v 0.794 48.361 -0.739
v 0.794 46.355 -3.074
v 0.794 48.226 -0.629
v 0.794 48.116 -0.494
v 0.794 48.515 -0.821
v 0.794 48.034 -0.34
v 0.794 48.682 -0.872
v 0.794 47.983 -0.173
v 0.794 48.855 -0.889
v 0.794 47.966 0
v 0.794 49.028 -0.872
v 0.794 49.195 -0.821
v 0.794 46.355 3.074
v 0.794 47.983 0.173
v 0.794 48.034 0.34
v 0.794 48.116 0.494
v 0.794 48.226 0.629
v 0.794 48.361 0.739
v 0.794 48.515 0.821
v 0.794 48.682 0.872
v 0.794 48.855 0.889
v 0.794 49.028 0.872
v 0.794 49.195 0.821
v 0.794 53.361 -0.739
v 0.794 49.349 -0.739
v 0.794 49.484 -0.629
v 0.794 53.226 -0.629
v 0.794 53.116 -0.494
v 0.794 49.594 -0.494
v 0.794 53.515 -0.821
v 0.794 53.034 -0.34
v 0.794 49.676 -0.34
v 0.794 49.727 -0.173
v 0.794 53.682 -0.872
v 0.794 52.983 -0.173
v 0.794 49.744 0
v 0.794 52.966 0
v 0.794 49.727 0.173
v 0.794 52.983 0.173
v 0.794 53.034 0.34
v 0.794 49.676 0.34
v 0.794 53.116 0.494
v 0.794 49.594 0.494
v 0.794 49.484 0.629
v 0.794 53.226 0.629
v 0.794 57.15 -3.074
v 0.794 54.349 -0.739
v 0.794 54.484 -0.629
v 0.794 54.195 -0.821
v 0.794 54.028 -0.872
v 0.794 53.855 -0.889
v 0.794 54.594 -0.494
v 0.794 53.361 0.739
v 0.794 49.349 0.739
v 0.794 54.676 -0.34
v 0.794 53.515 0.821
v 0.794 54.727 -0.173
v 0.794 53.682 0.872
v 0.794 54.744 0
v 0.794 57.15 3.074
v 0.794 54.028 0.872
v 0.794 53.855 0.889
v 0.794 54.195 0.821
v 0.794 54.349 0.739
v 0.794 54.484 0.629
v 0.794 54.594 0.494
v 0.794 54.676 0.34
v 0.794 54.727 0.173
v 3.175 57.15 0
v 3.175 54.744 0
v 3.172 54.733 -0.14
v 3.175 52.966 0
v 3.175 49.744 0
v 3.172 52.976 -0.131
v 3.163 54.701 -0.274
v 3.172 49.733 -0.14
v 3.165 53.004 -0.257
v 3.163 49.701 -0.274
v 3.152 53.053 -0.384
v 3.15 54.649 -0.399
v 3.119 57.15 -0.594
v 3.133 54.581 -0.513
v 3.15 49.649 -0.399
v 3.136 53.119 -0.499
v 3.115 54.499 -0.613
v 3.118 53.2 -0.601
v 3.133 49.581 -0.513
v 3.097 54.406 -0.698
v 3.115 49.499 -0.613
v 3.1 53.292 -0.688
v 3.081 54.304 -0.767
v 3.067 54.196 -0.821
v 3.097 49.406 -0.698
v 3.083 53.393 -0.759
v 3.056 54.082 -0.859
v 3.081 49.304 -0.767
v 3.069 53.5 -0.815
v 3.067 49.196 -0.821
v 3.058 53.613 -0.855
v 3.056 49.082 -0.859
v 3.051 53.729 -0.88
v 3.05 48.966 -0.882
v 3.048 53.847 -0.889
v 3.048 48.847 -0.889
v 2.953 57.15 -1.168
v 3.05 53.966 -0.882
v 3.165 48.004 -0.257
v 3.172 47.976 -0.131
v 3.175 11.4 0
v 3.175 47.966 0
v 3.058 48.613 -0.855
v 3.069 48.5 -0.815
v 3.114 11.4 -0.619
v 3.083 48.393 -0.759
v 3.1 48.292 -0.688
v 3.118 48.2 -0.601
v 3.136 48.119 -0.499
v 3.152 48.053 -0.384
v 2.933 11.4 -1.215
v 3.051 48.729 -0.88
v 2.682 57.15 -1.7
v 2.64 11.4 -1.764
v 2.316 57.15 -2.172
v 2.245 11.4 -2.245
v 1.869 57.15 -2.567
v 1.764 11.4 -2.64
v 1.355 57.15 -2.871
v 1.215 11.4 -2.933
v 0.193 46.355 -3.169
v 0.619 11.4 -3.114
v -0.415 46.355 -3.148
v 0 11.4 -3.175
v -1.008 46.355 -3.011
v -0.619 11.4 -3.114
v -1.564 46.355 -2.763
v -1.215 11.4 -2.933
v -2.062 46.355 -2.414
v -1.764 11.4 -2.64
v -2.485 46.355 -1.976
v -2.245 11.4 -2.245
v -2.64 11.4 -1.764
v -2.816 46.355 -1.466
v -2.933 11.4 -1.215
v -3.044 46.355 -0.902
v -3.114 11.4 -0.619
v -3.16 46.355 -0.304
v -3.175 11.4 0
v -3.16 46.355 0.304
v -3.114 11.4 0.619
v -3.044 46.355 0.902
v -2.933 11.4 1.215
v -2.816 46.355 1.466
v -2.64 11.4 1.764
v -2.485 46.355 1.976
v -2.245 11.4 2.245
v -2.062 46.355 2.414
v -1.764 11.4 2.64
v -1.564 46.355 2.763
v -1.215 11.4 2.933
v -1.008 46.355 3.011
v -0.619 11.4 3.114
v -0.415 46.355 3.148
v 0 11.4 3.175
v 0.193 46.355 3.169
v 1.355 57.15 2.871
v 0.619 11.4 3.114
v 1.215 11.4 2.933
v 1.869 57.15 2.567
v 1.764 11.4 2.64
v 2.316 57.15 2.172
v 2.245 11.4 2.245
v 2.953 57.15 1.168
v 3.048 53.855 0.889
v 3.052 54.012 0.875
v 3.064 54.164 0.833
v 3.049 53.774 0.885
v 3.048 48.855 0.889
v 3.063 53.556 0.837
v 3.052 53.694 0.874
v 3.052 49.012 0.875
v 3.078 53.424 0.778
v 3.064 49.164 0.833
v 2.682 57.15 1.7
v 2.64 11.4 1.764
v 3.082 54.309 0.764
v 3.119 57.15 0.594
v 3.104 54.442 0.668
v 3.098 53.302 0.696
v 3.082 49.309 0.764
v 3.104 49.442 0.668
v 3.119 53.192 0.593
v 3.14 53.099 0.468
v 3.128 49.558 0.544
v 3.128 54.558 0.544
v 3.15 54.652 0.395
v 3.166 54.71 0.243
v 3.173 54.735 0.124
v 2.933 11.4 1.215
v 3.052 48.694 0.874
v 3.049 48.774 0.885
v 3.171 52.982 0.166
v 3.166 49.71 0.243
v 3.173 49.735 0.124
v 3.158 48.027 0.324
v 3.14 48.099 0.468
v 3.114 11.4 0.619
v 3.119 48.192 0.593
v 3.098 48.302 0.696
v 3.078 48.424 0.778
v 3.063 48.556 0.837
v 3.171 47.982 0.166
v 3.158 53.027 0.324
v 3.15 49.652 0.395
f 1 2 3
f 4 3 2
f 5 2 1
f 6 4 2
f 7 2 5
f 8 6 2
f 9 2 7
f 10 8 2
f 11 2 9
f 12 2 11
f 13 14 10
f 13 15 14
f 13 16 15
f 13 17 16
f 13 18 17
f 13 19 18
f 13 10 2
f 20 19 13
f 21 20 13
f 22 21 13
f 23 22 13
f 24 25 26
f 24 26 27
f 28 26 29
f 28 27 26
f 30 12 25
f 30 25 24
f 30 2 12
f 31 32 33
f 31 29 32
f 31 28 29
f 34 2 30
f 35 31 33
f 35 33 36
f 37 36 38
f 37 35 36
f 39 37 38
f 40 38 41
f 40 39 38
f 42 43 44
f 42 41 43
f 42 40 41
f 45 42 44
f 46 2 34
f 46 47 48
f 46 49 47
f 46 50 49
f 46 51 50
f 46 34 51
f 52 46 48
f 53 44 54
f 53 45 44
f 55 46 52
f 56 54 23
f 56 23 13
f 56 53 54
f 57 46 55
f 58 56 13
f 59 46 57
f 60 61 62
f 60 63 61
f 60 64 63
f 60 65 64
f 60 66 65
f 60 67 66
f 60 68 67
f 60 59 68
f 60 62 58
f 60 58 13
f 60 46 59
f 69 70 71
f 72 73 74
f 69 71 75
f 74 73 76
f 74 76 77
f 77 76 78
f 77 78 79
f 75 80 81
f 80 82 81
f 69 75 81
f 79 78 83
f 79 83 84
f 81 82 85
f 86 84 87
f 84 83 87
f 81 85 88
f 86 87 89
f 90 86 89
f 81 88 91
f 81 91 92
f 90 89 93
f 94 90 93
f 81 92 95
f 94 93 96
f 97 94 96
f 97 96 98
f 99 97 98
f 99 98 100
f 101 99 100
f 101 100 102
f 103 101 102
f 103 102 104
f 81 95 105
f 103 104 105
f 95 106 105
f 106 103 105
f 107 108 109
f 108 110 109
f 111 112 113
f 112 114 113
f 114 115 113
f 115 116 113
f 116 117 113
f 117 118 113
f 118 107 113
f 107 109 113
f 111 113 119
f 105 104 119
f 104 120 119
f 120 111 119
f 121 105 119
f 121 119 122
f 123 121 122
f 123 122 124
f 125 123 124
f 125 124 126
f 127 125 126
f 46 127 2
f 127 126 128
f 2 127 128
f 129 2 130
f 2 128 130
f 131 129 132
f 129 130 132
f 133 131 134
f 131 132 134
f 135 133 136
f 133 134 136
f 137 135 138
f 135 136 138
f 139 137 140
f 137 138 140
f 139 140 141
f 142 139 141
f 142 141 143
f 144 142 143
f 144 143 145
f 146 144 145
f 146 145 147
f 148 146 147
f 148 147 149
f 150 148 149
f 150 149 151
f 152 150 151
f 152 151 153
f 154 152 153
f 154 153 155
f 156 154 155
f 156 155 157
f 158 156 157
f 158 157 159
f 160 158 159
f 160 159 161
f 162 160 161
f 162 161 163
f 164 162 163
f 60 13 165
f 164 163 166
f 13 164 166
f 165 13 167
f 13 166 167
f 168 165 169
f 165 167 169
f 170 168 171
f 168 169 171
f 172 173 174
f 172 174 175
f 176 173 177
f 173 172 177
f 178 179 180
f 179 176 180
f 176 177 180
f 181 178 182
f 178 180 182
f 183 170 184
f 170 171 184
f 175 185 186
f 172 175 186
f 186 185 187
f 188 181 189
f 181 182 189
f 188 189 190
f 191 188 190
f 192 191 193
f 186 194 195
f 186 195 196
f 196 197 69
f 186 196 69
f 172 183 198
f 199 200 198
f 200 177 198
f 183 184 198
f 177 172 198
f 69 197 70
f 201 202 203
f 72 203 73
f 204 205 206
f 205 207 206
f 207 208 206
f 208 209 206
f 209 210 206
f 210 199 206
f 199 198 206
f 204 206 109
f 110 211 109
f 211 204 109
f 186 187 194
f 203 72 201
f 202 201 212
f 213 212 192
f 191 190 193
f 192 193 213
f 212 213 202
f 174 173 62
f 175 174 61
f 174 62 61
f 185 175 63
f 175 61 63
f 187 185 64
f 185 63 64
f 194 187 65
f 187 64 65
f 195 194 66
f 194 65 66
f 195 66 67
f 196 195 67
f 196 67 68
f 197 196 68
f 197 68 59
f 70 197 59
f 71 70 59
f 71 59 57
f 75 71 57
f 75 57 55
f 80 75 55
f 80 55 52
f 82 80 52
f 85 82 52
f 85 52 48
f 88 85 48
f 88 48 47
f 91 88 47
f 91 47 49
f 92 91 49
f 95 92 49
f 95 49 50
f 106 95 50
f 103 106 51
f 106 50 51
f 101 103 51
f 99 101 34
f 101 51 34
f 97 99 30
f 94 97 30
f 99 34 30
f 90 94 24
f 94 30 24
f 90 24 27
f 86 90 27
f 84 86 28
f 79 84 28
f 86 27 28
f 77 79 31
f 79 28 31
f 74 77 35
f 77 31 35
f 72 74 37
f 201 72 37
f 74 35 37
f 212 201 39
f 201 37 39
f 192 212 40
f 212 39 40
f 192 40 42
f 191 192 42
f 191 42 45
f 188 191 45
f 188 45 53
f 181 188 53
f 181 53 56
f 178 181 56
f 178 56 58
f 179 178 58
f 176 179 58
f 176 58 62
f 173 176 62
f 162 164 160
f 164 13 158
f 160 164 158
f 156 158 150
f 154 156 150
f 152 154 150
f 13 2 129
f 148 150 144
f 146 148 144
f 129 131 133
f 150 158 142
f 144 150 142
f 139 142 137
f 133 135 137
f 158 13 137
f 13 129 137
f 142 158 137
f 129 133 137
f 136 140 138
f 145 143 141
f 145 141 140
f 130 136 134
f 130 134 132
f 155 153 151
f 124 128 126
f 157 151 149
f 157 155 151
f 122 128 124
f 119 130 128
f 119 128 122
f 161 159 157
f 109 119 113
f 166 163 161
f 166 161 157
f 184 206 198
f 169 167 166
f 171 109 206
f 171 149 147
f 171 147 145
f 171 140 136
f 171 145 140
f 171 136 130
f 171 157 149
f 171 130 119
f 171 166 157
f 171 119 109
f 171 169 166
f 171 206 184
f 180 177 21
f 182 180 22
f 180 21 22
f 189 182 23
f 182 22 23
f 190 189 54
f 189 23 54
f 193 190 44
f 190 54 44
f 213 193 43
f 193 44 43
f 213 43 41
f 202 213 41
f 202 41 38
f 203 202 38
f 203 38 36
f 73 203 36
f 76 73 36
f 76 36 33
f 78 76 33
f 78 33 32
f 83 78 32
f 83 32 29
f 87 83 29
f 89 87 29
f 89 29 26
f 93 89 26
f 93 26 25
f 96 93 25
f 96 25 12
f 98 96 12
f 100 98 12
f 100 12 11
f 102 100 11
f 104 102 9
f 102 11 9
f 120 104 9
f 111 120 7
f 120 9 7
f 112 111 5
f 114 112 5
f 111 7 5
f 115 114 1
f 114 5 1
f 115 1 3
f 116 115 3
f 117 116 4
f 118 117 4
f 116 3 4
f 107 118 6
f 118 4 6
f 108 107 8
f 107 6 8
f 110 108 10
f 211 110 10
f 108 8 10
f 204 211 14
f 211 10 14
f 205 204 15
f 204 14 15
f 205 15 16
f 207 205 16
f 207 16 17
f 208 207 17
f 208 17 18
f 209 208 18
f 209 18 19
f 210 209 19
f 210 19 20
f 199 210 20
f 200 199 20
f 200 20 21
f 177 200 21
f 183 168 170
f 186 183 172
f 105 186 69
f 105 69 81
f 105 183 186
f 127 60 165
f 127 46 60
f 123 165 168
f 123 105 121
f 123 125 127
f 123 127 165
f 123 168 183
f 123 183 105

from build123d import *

# Parameters (mm, degrees)
SKETCH_1_R          = 3.175
EXTRUDE_1_DEPTH     = 57.15
CUT_EXTRUDE_1_DEPTH = 10.795
SKETCH_3_R          = 0.889
CUT_EXTRUDE_2_DEPTH = 10.795
SKETCH_4_W          = 3.926157487
SKETCH_4_H          = 0.79375
CUT_EXTRUDE_3_DEPTH = 8.573
SKETCH_5_R          = 3.774888962
CUT_EXTRUDE_4_DEPTH = 11.4


with BuildPart() as part:
    # 草图1 → 凸台-拉伸1 (new body)
    with BuildSketch(Plane(origin=(0, 0, 0), x_dir=(1, 0, 0), z_dir=(0, 1, 0))):
        Circle(SKETCH_1_R)
    extrude(amount=EXTRUDE_1_DEPTH)

    # 草图2 → 切除-拉伸1 (cut)
    with BuildSketch(Plane(origin=(0, 57.15, 0), x_dir=(1, 0, 0), z_dir=(0, 1, 0))):
        Polygon((-0.794, 3.175), (0.794, 3.175), (0.794, -3.175), (-3.175, -3.175), (-3.175, 3.175), align=None)
    extrude(amount=-CUT_EXTRUDE_1_DEPTH, mode=Mode.SUBTRACT)

    # 草图3 → 切除-拉伸2 (cut)
    with BuildSketch(Plane.ZY.offset(-0.794)):
        with Locations((0, 53.855)):
            Circle(SKETCH_3_R)
        with Locations((0, 48.855)):
            Circle(SKETCH_3_R)
    extrude(amount=-CUT_EXTRUDE_2_DEPTH, mode=Mode.SUBTRACT)

    # 草图4 → 切除-拉伸3 (cut)
    with BuildSketch(Plane.XZ):
        with Locations((-0.018009896, -2.778125)):
            Rectangle(SKETCH_4_W, SKETCH_4_H)
    extrude(amount=-CUT_EXTRUDE_3_DEPTH, mode=Mode.SUBTRACT)

    # 草图5 → 切除-拉伸4 (cut)
    with BuildSketch(Plane.XZ):
        Circle(SKETCH_5_R)
    extrude(amount=-CUT_EXTRUDE_4_DEPTH, mode=Mode.SUBTRACT)


solid = part.part
